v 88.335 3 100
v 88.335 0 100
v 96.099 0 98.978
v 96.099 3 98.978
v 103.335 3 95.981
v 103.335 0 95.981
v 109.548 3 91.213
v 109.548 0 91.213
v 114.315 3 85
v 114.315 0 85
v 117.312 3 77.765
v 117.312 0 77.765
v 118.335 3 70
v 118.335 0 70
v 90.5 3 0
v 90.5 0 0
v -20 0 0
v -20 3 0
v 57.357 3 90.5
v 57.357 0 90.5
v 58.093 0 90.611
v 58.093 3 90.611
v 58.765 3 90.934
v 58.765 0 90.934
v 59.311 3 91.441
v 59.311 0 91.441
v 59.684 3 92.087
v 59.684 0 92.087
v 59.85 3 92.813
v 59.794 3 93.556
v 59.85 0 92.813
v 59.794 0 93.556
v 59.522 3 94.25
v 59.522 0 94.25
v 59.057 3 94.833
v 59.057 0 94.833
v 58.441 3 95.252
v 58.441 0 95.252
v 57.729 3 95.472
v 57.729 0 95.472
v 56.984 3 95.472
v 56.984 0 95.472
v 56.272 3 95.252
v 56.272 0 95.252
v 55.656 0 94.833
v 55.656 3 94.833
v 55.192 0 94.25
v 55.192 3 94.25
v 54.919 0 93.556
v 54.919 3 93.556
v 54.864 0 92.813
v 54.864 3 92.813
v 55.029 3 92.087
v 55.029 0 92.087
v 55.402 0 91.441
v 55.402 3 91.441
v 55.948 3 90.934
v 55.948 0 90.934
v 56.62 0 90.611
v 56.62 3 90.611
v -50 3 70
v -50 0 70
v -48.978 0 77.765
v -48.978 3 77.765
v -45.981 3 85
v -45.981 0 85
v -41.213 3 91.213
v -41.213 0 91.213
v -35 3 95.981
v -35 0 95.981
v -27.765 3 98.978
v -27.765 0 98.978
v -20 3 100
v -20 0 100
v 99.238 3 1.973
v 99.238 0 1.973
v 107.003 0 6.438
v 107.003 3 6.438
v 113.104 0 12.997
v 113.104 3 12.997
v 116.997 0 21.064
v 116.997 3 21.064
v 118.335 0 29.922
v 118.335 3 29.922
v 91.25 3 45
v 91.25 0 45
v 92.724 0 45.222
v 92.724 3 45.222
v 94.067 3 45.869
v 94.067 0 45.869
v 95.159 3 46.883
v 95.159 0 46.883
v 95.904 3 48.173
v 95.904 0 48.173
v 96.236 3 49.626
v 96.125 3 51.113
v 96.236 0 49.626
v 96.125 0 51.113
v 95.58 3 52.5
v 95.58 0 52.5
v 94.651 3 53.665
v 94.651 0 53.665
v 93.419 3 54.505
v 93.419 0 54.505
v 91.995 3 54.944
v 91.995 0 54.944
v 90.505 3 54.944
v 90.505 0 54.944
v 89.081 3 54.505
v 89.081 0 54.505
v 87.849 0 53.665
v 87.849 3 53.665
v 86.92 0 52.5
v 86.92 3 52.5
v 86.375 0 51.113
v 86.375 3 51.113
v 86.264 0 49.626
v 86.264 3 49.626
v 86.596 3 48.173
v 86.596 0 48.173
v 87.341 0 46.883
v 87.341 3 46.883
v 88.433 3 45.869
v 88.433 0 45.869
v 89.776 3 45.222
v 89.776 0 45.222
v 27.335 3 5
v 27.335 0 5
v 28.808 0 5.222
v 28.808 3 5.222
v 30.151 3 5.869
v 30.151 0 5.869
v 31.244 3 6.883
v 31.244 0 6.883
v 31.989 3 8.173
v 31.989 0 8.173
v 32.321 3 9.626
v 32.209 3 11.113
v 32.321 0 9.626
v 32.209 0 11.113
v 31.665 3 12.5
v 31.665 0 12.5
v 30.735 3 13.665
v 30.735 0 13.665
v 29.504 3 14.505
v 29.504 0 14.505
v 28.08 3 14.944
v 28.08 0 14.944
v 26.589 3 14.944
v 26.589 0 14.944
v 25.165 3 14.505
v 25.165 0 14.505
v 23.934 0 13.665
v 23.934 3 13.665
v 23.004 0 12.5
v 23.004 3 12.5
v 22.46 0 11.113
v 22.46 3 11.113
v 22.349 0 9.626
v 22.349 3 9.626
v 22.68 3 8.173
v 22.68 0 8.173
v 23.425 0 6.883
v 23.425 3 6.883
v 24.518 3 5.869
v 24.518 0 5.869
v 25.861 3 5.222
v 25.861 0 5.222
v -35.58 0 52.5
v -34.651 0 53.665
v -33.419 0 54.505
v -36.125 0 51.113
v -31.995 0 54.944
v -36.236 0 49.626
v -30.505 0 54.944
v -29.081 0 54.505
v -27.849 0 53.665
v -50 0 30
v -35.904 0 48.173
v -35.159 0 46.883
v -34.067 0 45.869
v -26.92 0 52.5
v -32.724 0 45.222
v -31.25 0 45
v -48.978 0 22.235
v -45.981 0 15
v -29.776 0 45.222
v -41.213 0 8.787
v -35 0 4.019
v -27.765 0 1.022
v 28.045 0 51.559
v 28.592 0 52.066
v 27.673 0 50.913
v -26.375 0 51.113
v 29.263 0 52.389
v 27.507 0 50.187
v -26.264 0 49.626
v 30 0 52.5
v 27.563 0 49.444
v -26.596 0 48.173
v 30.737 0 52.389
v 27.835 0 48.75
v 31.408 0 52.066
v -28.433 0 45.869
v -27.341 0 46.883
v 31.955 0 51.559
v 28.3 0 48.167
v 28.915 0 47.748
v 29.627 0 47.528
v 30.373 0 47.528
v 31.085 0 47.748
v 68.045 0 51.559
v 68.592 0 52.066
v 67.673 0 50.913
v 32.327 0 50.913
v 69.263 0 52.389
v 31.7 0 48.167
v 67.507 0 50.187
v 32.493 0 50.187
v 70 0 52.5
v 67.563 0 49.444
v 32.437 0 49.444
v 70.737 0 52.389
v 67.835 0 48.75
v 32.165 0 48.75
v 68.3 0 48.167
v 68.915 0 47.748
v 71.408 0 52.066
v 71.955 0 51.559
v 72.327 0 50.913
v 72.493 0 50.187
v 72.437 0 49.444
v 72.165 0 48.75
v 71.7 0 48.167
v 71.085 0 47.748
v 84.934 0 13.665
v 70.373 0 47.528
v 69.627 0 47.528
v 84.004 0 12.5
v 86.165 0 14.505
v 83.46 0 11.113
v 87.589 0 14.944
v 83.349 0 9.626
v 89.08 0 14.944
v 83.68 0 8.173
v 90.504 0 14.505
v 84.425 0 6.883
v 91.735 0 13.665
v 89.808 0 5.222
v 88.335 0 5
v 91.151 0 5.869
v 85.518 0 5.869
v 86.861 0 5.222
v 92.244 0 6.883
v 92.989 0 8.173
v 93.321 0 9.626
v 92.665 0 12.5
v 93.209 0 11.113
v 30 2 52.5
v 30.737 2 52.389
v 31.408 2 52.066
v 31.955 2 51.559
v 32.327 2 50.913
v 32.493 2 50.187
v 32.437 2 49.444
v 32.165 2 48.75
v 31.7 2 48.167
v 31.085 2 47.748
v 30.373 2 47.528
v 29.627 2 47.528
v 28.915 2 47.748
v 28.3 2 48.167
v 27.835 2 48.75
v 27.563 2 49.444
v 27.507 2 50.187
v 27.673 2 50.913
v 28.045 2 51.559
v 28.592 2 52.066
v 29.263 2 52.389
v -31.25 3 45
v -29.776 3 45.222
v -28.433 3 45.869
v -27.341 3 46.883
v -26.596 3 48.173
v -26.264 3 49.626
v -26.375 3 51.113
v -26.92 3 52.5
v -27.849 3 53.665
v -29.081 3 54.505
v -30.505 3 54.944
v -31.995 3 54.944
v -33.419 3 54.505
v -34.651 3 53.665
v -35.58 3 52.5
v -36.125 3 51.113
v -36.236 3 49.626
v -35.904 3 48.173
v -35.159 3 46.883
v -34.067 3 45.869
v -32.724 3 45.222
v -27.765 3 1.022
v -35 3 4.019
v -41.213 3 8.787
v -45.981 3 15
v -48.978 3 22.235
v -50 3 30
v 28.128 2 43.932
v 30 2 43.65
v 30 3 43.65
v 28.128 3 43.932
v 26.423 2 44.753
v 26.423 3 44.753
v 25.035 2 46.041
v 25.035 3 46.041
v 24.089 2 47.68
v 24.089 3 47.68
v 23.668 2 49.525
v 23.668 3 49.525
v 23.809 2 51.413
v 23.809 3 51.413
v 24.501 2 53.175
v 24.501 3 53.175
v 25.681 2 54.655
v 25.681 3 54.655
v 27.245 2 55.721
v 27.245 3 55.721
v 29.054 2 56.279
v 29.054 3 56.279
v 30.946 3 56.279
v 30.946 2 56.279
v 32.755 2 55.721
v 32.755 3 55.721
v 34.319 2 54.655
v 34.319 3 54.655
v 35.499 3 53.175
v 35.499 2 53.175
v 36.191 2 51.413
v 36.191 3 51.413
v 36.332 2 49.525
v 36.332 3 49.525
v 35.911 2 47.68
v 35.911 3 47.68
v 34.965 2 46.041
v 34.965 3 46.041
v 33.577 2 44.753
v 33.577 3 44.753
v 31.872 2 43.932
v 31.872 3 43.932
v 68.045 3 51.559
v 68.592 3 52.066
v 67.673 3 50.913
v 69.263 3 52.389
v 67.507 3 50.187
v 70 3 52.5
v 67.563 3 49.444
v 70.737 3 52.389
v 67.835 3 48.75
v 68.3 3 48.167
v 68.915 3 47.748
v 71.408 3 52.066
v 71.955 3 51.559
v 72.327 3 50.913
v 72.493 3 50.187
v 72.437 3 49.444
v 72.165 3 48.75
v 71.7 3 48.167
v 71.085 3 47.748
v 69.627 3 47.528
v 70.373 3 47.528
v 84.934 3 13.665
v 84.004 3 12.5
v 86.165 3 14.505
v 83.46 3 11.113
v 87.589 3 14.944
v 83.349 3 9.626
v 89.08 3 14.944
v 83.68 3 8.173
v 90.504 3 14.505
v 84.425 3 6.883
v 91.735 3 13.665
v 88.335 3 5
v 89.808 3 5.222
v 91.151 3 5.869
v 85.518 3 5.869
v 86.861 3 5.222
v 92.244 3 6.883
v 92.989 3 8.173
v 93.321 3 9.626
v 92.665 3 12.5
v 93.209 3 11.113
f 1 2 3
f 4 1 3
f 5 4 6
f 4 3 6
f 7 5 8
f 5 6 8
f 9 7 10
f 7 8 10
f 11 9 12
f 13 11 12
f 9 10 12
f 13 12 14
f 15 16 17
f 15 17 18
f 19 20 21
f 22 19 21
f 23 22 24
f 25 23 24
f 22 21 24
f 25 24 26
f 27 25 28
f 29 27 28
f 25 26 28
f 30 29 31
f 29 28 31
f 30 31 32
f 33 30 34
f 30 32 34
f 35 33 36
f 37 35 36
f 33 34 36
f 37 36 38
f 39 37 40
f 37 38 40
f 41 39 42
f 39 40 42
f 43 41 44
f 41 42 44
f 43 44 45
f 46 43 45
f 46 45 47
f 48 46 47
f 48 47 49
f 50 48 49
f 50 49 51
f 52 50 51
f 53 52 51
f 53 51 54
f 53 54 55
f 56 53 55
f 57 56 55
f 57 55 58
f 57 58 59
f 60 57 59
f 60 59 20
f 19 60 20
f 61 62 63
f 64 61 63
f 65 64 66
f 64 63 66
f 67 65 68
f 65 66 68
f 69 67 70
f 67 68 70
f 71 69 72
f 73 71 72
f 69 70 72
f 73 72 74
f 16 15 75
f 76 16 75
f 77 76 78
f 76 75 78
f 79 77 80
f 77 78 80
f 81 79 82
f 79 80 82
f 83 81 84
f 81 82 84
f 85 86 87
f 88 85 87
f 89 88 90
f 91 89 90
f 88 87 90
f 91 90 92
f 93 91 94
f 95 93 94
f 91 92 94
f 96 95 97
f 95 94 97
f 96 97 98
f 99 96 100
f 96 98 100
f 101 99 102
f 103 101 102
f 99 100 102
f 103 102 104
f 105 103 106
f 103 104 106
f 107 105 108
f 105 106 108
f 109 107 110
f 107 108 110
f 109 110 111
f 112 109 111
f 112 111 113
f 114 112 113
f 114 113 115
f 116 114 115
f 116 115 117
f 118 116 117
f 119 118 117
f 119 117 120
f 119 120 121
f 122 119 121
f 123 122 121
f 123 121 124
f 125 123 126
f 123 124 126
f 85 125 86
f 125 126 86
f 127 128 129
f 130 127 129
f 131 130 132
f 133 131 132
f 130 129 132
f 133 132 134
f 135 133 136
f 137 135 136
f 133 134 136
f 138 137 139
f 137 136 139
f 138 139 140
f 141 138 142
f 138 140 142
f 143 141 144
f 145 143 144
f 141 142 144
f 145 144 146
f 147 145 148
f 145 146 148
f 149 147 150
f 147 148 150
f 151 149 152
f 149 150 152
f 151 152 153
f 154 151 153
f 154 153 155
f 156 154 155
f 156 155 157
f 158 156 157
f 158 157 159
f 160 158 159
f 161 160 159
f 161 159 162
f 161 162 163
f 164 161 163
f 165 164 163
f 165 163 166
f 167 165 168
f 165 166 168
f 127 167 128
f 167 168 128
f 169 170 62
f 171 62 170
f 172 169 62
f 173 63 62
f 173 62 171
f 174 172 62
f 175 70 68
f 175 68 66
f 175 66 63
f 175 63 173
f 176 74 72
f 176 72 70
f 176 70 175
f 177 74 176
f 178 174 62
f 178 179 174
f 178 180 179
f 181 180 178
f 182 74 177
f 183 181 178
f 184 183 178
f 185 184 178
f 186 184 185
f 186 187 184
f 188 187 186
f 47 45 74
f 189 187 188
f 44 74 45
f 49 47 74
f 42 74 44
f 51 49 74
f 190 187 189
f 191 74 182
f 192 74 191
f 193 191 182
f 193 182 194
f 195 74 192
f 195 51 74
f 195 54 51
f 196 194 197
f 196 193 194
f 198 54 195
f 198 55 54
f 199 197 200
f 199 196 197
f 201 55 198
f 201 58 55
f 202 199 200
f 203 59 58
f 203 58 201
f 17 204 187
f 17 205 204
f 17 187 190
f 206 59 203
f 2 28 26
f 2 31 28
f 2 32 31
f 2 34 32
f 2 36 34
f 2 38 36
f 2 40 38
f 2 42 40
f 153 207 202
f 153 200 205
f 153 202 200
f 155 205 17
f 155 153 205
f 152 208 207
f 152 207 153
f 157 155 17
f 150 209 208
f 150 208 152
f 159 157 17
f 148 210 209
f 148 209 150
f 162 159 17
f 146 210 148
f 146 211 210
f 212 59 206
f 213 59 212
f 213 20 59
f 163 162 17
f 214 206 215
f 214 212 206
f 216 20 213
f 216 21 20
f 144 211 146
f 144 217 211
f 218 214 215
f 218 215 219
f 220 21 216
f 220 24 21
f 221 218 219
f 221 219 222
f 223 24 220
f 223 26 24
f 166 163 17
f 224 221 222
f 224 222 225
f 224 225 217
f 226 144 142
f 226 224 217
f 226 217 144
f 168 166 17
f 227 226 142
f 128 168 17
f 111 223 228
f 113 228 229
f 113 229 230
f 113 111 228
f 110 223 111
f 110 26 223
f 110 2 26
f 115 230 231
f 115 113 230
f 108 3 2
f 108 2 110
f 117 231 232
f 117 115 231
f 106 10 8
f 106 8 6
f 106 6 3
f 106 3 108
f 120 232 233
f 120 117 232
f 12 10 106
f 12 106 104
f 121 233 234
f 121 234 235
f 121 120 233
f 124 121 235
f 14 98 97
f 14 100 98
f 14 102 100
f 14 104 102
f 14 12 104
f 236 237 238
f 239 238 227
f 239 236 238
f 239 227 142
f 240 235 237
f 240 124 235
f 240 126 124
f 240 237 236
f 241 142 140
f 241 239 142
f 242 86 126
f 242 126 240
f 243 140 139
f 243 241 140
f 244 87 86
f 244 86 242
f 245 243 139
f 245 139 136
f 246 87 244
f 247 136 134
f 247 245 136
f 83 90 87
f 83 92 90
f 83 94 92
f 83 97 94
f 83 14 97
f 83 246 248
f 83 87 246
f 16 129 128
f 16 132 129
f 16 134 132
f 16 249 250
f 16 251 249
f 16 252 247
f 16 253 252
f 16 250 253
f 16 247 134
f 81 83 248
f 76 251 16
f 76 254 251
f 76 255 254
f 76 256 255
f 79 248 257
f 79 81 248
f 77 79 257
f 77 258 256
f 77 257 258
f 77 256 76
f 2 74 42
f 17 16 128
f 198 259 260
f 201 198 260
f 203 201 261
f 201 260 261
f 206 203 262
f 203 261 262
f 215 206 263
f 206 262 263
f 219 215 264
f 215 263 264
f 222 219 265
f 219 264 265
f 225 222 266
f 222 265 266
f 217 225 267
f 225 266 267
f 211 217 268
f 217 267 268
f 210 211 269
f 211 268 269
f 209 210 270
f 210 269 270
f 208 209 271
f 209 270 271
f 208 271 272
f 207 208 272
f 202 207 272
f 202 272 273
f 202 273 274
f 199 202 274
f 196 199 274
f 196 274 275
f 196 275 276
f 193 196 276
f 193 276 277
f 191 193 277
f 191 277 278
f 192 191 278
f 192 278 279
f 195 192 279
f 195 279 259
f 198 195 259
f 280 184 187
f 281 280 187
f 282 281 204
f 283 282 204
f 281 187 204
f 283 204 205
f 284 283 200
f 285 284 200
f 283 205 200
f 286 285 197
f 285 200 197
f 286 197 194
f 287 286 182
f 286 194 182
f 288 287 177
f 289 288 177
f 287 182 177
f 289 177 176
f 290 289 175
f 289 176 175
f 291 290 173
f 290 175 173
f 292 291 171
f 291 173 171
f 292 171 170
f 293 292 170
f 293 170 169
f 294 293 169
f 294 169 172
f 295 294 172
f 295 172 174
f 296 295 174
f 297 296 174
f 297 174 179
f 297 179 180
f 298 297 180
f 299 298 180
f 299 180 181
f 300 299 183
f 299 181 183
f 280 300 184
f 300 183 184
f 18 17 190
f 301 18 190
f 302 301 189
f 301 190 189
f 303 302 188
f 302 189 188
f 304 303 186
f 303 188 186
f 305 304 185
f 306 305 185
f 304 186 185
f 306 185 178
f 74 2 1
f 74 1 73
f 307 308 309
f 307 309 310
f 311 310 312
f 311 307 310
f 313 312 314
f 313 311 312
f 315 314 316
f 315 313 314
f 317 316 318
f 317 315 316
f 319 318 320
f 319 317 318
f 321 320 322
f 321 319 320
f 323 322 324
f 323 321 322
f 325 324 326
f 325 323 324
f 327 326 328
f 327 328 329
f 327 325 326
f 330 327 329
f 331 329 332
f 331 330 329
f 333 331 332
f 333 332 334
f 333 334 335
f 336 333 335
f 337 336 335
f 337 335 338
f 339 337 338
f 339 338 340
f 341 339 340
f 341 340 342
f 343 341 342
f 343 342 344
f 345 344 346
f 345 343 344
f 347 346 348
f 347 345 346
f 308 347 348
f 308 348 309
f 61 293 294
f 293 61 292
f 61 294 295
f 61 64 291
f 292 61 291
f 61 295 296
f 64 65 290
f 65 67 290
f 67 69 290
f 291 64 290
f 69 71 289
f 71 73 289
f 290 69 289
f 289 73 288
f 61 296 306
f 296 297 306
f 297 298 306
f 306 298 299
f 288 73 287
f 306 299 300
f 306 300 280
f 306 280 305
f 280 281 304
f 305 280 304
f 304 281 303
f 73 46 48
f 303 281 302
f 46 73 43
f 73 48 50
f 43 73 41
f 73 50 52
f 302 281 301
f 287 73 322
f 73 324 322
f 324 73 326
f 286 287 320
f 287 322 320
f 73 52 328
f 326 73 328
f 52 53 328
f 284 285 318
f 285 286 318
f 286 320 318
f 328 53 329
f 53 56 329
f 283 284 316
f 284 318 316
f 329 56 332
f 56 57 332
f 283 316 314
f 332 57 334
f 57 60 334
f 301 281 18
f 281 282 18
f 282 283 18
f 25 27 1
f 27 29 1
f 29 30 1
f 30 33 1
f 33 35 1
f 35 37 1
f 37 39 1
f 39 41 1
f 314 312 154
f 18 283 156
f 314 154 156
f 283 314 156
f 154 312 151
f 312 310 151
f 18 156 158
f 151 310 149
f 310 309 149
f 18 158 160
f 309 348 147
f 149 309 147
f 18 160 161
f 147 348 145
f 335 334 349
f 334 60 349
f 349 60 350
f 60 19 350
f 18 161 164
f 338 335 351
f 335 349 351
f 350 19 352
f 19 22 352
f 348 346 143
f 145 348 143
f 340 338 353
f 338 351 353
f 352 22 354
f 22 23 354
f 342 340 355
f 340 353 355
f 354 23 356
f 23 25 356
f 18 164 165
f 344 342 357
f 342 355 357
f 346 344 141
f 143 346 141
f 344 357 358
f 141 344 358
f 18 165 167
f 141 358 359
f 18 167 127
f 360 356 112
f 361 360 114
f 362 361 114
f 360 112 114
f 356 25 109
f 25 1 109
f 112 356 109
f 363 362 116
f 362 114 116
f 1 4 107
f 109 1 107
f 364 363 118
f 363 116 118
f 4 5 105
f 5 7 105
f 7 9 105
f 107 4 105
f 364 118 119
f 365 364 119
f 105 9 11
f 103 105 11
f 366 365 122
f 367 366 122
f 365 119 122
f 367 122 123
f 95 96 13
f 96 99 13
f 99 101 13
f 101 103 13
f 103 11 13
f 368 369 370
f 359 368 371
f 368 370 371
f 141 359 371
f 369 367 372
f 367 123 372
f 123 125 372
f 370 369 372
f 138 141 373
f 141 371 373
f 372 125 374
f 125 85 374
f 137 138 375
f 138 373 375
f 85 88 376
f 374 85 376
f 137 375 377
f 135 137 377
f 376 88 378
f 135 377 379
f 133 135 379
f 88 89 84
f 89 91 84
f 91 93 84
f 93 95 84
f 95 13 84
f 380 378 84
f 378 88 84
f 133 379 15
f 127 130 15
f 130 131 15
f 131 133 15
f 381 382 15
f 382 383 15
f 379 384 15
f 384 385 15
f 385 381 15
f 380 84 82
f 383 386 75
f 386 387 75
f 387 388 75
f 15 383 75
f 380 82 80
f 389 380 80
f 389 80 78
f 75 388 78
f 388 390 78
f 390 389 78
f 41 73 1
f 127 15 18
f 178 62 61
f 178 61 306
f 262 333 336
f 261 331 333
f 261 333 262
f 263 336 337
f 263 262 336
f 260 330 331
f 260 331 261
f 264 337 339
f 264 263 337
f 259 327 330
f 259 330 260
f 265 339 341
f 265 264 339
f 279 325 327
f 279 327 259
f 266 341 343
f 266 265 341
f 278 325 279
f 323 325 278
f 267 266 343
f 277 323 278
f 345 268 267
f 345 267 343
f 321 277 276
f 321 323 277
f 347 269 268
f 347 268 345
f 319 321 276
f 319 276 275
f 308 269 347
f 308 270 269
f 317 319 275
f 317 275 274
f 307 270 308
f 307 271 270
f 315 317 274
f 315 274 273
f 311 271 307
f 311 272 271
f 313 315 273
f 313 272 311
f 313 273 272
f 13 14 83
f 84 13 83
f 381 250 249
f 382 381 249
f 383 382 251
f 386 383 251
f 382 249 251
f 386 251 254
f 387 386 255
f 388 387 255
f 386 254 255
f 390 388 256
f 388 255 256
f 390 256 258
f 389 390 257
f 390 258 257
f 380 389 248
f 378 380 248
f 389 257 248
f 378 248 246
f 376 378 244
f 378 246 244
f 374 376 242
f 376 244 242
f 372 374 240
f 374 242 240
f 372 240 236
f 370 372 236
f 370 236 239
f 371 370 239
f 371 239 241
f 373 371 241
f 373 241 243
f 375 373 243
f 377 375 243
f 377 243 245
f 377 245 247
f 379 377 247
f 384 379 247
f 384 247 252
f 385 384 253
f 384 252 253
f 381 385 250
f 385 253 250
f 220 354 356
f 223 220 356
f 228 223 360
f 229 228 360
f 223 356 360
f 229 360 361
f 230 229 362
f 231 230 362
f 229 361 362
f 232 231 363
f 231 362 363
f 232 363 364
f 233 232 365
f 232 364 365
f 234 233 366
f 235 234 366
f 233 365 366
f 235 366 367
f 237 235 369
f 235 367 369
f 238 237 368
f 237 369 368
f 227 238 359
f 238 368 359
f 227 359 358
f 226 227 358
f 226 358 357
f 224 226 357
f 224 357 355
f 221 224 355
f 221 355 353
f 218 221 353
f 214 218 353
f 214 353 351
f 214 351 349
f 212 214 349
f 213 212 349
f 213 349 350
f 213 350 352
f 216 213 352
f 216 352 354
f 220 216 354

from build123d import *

# Parameters (mm, degrees)
EXTRUDE_1_DEPTH           = 50
EXTRUDE_1_DEPTH_BACK      = 50
SKETCH_2_W                = 200
SKETCH_2_H                = 100
EXTRUDE_2_DEPTH           = 40
SKETCH_3_W                = 200
SKETCH_3_H                = 34
CUT_EXTRUDE_1_DEPTH       = 100
CUT_EXTRUDE_2_DEPTH       = 279.66871012
SKETCH_8_R                = 2.5
CUT_EXTRUDE_4_DEPTH       = 276.238532913
SKETCH_10_R               = 5
CUT_EXTRUDE_5_DEPTH       = 260.608358879
EXTRUDE_5_DEPTH           = 10
SKETCH_13_W               = 74.115787845
SKETCH_13_H               = 3
EXTRUDE_7_DEPTH           = 81
SKETCH_14_W               = 207.5
SKETCH_14_H               = 100
EXTRUDE_8_DEPTH           = 7
EXTRUDE_9_DEPTH           = 10
SKETCH_17_R               = 6.35
CUT_EXTRUDE_6_DEPTH       = 1
CUT_EXTRUDE_START         = -1
SKETCH_18_R               = 6.35
CUT_EXTRUDE_7_DEPTH       = 1
SKETCH_20_R               = 5
CUT_EXTRUDE_8_DEPTH       = 3
CUT_EXTRUDE_9_DEPTH       = 273.255129638
CUT_EXTRUDE_9_DEPTH_BACK  = 273.255129638
SKETCH_21_W               = 31.665374736
SKETCH_21_H               = 100
SKETCH_22_R               = 5
EXTRUDE_10_DEPTH          = 37
FILLET_1_R                = 30
FILLET_2_R                = 30
CUT_EXTRUDE_10_DEPTH      = 248.444254611
CUT_EXTRUDE_10_DEPTH_BACK = 248.444254611
CUT_EXTRUDE_11_DEPTH      = 211.689689342
CUT_EXTRUDE_11_DEPTH_BACK = 211.689689342
CUT_EXTRUDE_12_DEPTH      = 174.368632309
CUT_EXTRUDE_12_DEPTH_BACK = 174.368632309
SKETCH_26_R               = 5
CUT_EXTRUDE_13_DEPTH      = 153.295269567
CUT_EXTRUDE_13_DEPTH_BACK = 153.295269567
CUT_EXTRUDE_14_DEPTH      = 160.286168691
CUT_EXTRUDE_14_DEPTH_BACK = 160.286168691
SKETCH_30_R               = 7.5
CUT_EXTRUDE_15_DEPTH      = 160.286168691
CUT_EXTRUDE_15_DEPTH_BACK = 160.286168691
SKETCH_31_R               = 7.5
SKETCH_32_R               = 7.5
SKETCH_32_R_2             = 5
EXTRUDE_12_DEPTH          = 3
SKETCH_33_R               = 7.5
SKETCH_33_R_2             = 5
EXTRUDE_13_DEPTH          = 3
SKETCH_34_R               = 5
EXTRUDE_14_DEPTH          = 45
CUT_EXTRUDE_19_DEPTH      = 178.031776809
CUT_EXTRUDE_19_DEPTH_BACK = 178.031776809
SKETCH_41_W               = 127.955451874
SKETCH_41_H               = 44.187888027
CUT_EXTRUDE_20_DEPTH      = 173.639074372
CUT_EXTRUDE_20_DEPTH_BACK = 173.639074372
SKETCH_42_W               = 60.696300107
SKETCH_42_H               = 16.694862056
SKETCH_44_R               = 2.5
CUT_EXTRUDE_21_DEPTH      = 10


with BuildPart() as part:
    # 草图1 → 凸台-拉伸1 (new, two sides: drawn at the far end of the back side and taken through both)
    with BuildSketch(Plane(origin=(0, 0, 0), x_dir=(1, 0, 0), z_dir=(0, 1, 0)).offset(-EXTRUDE_1_DEPTH_BACK)):
        Polygon((9.5, 12.5), (9.5, 0), (90.5, 0), (90.5, 12.5), (90.5, 212.5), (9.5, 212.5), align=None)
    extrude(amount=EXTRUDE_1_DEPTH + EXTRUDE_1_DEPTH_BACK)

    # 草图2 → 凸台-拉伸2 (add)
    with BuildSketch(Plane(origin=(0, 0, 0), x_dir=(-1, 0, 0), z_dir=(0, -1, 0))):
        with Locations((-50, -50)):
            Rectangle(SKETCH_2_W, SKETCH_2_H)
    extrude(amount=-EXTRUDE_2_DEPTH)

    # 草图3 → 切除-拉伸1 (cut)
    with BuildSketch(Plane.XY.offset(100)):
        with Locations((50, 20)):
            Rectangle(SKETCH_3_W, SKETCH_3_H)
    extrude(amount=-CUT_EXTRUDE_1_DEPTH, mode=Mode.SUBTRACT)

    # 草图6 → 切除-拉伸2 (cut, through all)
    with BuildSketch(Plane(origin=(0, 50, 0), x_dir=(1, 0, 0), z_dir=(0, 1, 0))):
        Polygon((12.5, 905.325014188), (12.5, 212.5), (12.5, 5), (87.5, 5), (87.5, 212.5), (87.5, 905.325014188), (87.5, 2290.975042562), (12.5, 2290.975042562), align=None)
    extrude(amount=-CUT_EXTRUDE_2_DEPTH, mode=Mode.SUBTRACT)

    # 草图8 → 切除-拉伸4 (cut, through all)
    with BuildSketch(Plane(origin=(0, 40, 0), x_dir=(1, 0, 0), z_dir=(0, 1, 0))):
        with Locations(Location((70, -50, 0), (0, 0, 270))):
            Circle(SKETCH_8_R)
        with Locations(Location((30, -50, 0), (0, 0, 270))):
            Circle(SKETCH_8_R)
    extrude(amount=-CUT_EXTRUDE_4_DEPTH, mode=Mode.SUBTRACT)

    # 草图10 → 切除-拉伸5 (cut, through all)
    with BuildSketch(Plane(origin=(90.5, 0, 0), x_dir=(0, 0, -1), z_dir=(1, 0, 0))):
        with Locations((80, 0)):
            Circle(SKETCH_10_R)
        with Locations((180, 0)):
            Circle(SKETCH_10_R)
    extrude(amount=-CUT_EXTRUDE_5_DEPTH, mode=Mode.SUBTRACT)

    # 草图11 → 凸台-拉伸5 (add)
    with BuildSketch(Plane.ZY.offset(-9.5)):
        Polygon((-30.905613639, 83.415207604), (-74.094429483, 50), (0, 50), (0, 40), (83.32101017, 40), align=None)
    extrude(amount=-EXTRUDE_5_DEPTH)

    # 草图13 → 凸台-拉伸7 (add)
    with BuildSketch(Plane(origin=(90.5, 0, 0), x_dir=(0, 0, -1), z_dir=(1, 0, 0))):
        with Locations((37.057893922, 51.5)):
            Rectangle(SKETCH_13_W, SKETCH_13_H)
    extrude(amount=-EXTRUDE_7_DEPTH)

    # 草图14 → 凸台-拉伸8 (add)
    with BuildSketch(Plane(origin=(12.5, 0, 0), x_dir=(0, 0, -1), z_dir=(1, 0, 0))):
        with Locations((108.75, 0)):
            Rectangle(SKETCH_14_W, SKETCH_14_H)
    extrude(amount=EXTRUDE_8_DEPTH)

    # 草图15 → 凸台-拉伸9 (add)
    with BuildSketch(Plane(origin=(90.5, 0, 0), x_dir=(0, 0, -1), z_dir=(1, 0, 0))):
        Polygon((30.905613639, 83.415207604), (-82.902171575, 40), (0, 40), (0, 53), (70.216960007, 53), align=None)
    extrude(amount=-EXTRUDE_9_DEPTH)

    # 草图17 → 切除-拉伸6 (cut)
    with BuildSketch(Plane(origin=(0, 37, 0), x_dir=(-1, 0, 0), z_dir=(0, -1, 0))):
        with Locations(Location((-30, -50, 0), (0, 0, 90))):
            Circle(SKETCH_17_R)
    extrude(amount=-CUT_EXTRUDE_6_DEPTH, mode=Mode.SUBTRACT)

    # 草图18 → 切除-拉伸7 (cut)
    with BuildSketch(Plane(origin=(0, 3, 0), x_dir=(1, 0, 0), z_dir=(0, 1, 0)).offset(CUT_EXTRUDE_START)):
        with Locations(Location((30, -50, 0), (0, 0, 90))):
            Circle(SKETCH_18_R)
    extrude(amount=CUT_EXTRUDE_7_DEPTH, mode=Mode.SUBTRACT)

    # 草图20 → 切除-拉伸8 (cut)
    with BuildSketch(Plane.XZ):
        with Locations(Location((-31.25, 50, 0), (0, 0, 270))):
            Circle(SKETCH_20_R)
        with Locations(Location((91.25, 50, 0), (0, 0, 270))):
            Circle(SKETCH_20_R)
    extrude(amount=-CUT_EXTRUDE_8_DEPTH, mode=Mode.SUBTRACT)

    # 草图21 → 切除-拉伸9 (cut, two sides: drawn at the far end of the back side and taken through both)
    with BuildSketch(Plane(origin=(0, 3, 0), x_dir=(1, 0, 0), z_dir=(0, 1, 0)).offset(-CUT_EXTRUDE_9_DEPTH_BACK)):
        with Locations((134.167312632, -50)):
            Rectangle(SKETCH_21_W, SKETCH_21_H)
    extrude(amount=CUT_EXTRUDE_9_DEPTH + CUT_EXTRUDE_9_DEPTH_BACK, mode=Mode.SUBTRACT)

    # 草图22 → 凸台-拉伸10 (add)
    with BuildSketch(Plane.XZ):
        with Locations((-28.834995313, 14.93844285)):
            Circle(SKETCH_22_R)
        with Locations((99.943738589, 14.93844285)):
            Circle(SKETCH_22_R)
        with Locations((47.358621855, 88.902784002)):
            Circle(SKETCH_22_R)
    extrude(amount=-EXTRUDE_10_DEPTH)

    # 圆角1
    # the kernel refuses this fillet: 30 mm, written as the material it takes off along each edge
    with BuildSketch(Plane(origin=(-32.536340759, 83.415207604, -30.905613639), x_dir=(0, -0.6119293356637439, -0.7909124402575352), z_dir=(1, 0, 0))) as fillet_1_piece_1:
        with BuildLine():
            CenterArc((FILLET_1_R * 0.560484543454, -FILLET_1_R), FILLET_1_R, 90, 58.539912966)
            Line((-FILLET_1_R * 0.292519393108, -FILLET_1_R * 0.478095521948), (-FILLET_1_R * 0.309579471839, -FILLET_1_R * 0.467657432387))
            Line((-FILLET_1_R * 0.309579471839, -FILLET_1_R * 0.467657432387), (-FILLET_1_R * 0.0112096908691, FILLET_1_R * 0.02))
            Line((-FILLET_1_R * 0.0112096908691, FILLET_1_R * 0.02), (FILLET_1_R * 0.560484543454, FILLET_1_R * 0.02))
            Line((FILLET_1_R * 0.560484543454, FILLET_1_R * 0.02), (FILLET_1_R * 0.560484543454, 0))
        make_face()
    extrude(amount=94.072681518, mode=Mode.SUBTRACT)
    with BuildSketch(Plane(origin=(132.596564701, 83.415207604, -30.905613639), x_dir=(0, -0.6119293356637436, -0.7909124402575354), z_dir=(-1, 0, 0))) as fillet_1_piece_2:
        with BuildLine():
            CenterArc((FILLET_1_R * 0.561287529341, FILLET_1_R), FILLET_1_R, 211.390091687, 58.609908313)
            Line((-FILLET_1_R * 0.292353354769, FILLET_1_R * 0.479137982787), (-FILLET_1_R * 0.309426172451, FILLET_1_R * 0.468720742443))
            Line((-FILLET_1_R * 0.309426172451, FILLET_1_R * 0.468720742443), (-FILLET_1_R * 0.0112257505868, -FILLET_1_R * 0.02))
            Line((-FILLET_1_R * 0.0112257505868, -FILLET_1_R * 0.02), (FILLET_1_R * 0.561287529341, -FILLET_1_R * 0.02))
            Line((FILLET_1_R * 0.561287529341, -FILLET_1_R * 0.02), (FILLET_1_R * 0.561287529341, 0))
        make_face()
    extrude(amount=94.193129401, mode=Mode.SUBTRACT)
    with BuildSketch(Plane(origin=(118.334625264, -38, 100), x_dir=(-1, 0, 0), z_dir=(0, 1, 0)), Plane(origin=(118.334625264, -75, 100), x_dir=(-1, 0, 0), z_dir=(0, 1, 0)), Plane(origin=(-50, -38, 0), x_dir=(1, 0, 0), z_dir=(0, 1, 0)), Plane(origin=(-50, -38, 100), x_dir=(0, 0, -1), z_dir=(0, 1, 0)), Plane(origin=(-50, -75, 100), x_dir=(0, 0, -1), z_dir=(0, 1, 0)), Plane(origin=(-50, -75, 0), x_dir=(1, 0, 0), z_dir=(0, 1, 0))) as fillet_1_piece_3:
        with BuildLine():
            CenterArc((FILLET_1_R, -FILLET_1_R), FILLET_1_R, 90, 90)
            Line((0, -FILLET_1_R), (-FILLET_1_R * 0.02, -FILLET_1_R))
            Line((-FILLET_1_R * 0.02, -FILLET_1_R), (-FILLET_1_R * 0.02, FILLET_1_R * 0.02))
            Line((-FILLET_1_R * 0.02, FILLET_1_R * 0.02), (FILLET_1_R, FILLET_1_R * 0.02))
            Line((FILLET_1_R, FILLET_1_R * 0.02), (FILLET_1_R, 0))
        make_face()
    extrude(amount=153, mode=Mode.SUBTRACT)
    with BuildSketch(Plane(origin=(118.334625264, 114.804376219, 0), x_dir=(0, 0, 1), z_dir=(0, -1, 0))) as fillet_1_piece_4:
        with BuildLine():
            CenterArc((29.921750488, 30), FILLET_1_R, 184.139160489, 85.860839511)
            Line((0, 27.834625264), (-0.59843501, 27.791317769))
            ThreePointArc((-0.59843501, 27.791317769), (-0.6, 13.917312632), (-0.6, 0))
            Line((-0.6, 0), (0, -0.6))
            Line((0, -0.6), (29.921750488, -0.6))
            Line((29.921750488, -0.6), (29.921750488, 0))
        make_face()
    extrude(amount=152.608752439, mode=Mode.SUBTRACT)
    with BuildSketch(Plane(origin=(118.334625264, 77.804376219, 0), x_dir=(-1, 0, 0), z_dir=(0, -1, 0))) as fillet_1_piece_5:
        with BuildLine():
            CenterArc((30, -29.921750488), FILLET_1_R, 94.139160489, 85.860839511)
            Line((0, -29.921750488), (-0.6, -29.921750488))
            Line((-0.6, -29.921750488), (-0.6, 0))
            Line((-0.6, 0), (0, 0.6))
            ThreePointArc((0, 0.6), (13.917312632, 0.6), (27.791317769, 0.59843501))
            Line((27.791317769, 0.59843501), (27.834625264, 0))
        make_face()
    extrude(amount=152.608752439, mode=Mode.SUBTRACT)

    # 圆角2
    fillet_2_edges = [part.edges().sort_by_distance(p)[0] for p in [
        (89, 50, -212.5),
        (89, -50, -212.5),
        (14.5, 50, -212.5),
        (14.5, -50, -212.5),
    ]]
    fillet(fillet_2_edges, radius=FILLET_2_R)

    # 草图23 → 切除-拉伸10 (cut, two sides: drawn at the far end of the back side and taken through both)
    with BuildSketch(Plane(origin=(19.5, 0, 0), x_dir=(0, 0, -1), z_dir=(1, 0, 0)).offset(-CUT_EXTRUDE_10_DEPTH_BACK)):
        Polygon((-82.902171575, 40), (15.172878857, 77.413509693), (30.26062931, 83.169160038), (82.911746167, 53.484816406), (216.982404769, 51.400816531), (216.982404769, -53.030732743), (0, -55.346288159), (0, 40), align=None)
    extrude(amount=CUT_EXTRUDE_10_DEPTH + CUT_EXTRUDE_10_DEPTH_BACK, mode=Mode.SUBTRACT)

    # 草图25 → 切除-拉伸11 (cut, two sides: drawn at the far end of the back side and taken through both)
    with BuildSketch(Plane(origin=(118.334625264, 0, 0), x_dir=(0, 0, -1), z_dir=(1, 0, 0)).offset(-CUT_EXTRUDE_11_DEPTH_BACK)):
        Polygon((-96.999238457, 37), (-5.714105567, 37), (-5.714105567, 3), (-98.622428797, 3), align=None)
    extrude(amount=CUT_EXTRUDE_11_DEPTH + CUT_EXTRUDE_11_DEPTH_BACK, mode=Mode.SUBTRACT)


with BuildPart() as cut_extrude_11_piece_1:
    # of the separate pieces the step leaves, piece 1, a body of its own (cut_extrude_11_pieces)
    add(part.part.solids().sort_by_distance((118.334625264, 37, 70))[0])


with BuildPart() as cut_extrude_11_piece_2:
    # of the separate pieces the step leaves, piece 2, a body of its own (cut_extrude_11_pieces)
    add(part.part.solids().sort_by_distance((-20, 0, 0))[0])


with BuildPart() as cut_extrude_12_tool:
    # 草图26 → 切除-拉伸12 (new, two sides: drawn at the far end of the back side and taken through both)
    with BuildSketch(Plane.XZ.offset(-CUT_EXTRUDE_12_DEPTH_BACK)):
        with Locations(Location((88.334625264, 10, 0), (0, 0, 270))):
            Circle(SKETCH_26_R)
        with Locations(Location((27.334625264, 10, 0), (0, 0, 270))):
            Circle(SKETCH_26_R)
    extrude(amount=CUT_EXTRUDE_12_DEPTH + CUT_EXTRUDE_12_DEPTH_BACK)


with BuildPart() as cut_extrude_11_piece_1_1:
    add(cut_extrude_11_piece_1.part)

    # 切除-拉伸12: cut by cut_extrude_12_tool
    add(cut_extrude_12_tool.part, mode=Mode.SUBTRACT)

    # 草图27 → 切除-拉伸13 (cut, two sides: drawn at the far end of the back side and taken through both)
    with BuildSketch(Plane.ZY.offset(-34.5).offset(-CUT_EXTRUDE_13_DEPTH_BACK)):
        Polygon((-18.94184398, 81.696068066), (-17.663883038, 66.307288383), (80.739109538, 40), (87.341907742, 40), align=None)
    extrude(amount=CUT_EXTRUDE_13_DEPTH + CUT_EXTRUDE_13_DEPTH_BACK, mode=Mode.SUBTRACT)


with BuildPart() as cut_extrude_11_piece_2_1:
    add(cut_extrude_11_piece_2.part)

    # 切除-拉伸12: cut by cut_extrude_12_tool
    add(cut_extrude_12_tool.part, mode=Mode.SUBTRACT)


with BuildPart() as cut_extrude_14_tool:
    # 草图30 → 切除-拉伸14 (new, two sides: drawn at the far end of the back side and taken through both)
    with BuildSketch(Plane.XZ.offset(-37).offset(-CUT_EXTRUDE_14_DEPTH_BACK)):
        with Locations(Location((88.334625264, 10, 0), (0, 0, 270))):
            Circle(SKETCH_30_R)
    extrude(amount=CUT_EXTRUDE_14_DEPTH + CUT_EXTRUDE_14_DEPTH_BACK)


with BuildPart() as cut_extrude_11_piece_1_2:
    add(cut_extrude_11_piece_1_1.part)

    # 切除-拉伸14: cut by cut_extrude_14_tool
    add(cut_extrude_14_tool.part, mode=Mode.SUBTRACT)


with BuildPart() as cut_extrude_11_piece_2_2:
    add(cut_extrude_11_piece_2_1.part)

    # 切除-拉伸14: cut by cut_extrude_14_tool
    add(cut_extrude_14_tool.part, mode=Mode.SUBTRACT)


with BuildPart() as cut_extrude_15_tool:
    # 草图31 → 切除-拉伸15 (new, two sides: drawn at the far end of the back side and taken through both)
    with BuildSketch(Plane.XZ.offset(-37).offset(-CUT_EXTRUDE_15_DEPTH_BACK)):
        with Locations(Location((27.334625264, 10, 0), (0, 0, 270))):
            Circle(SKETCH_31_R)
    extrude(amount=CUT_EXTRUDE_15_DEPTH + CUT_EXTRUDE_15_DEPTH_BACK)


with BuildPart() as cut_extrude_11_piece_1_3:
    add(cut_extrude_11_piece_1_2.part)

    # 切除-拉伸15: cut by cut_extrude_15_tool
    add(cut_extrude_15_tool.part, mode=Mode.SUBTRACT)



with BuildPart() as cut_extrude_11_piece_2_3:
    add(cut_extrude_11_piece_2_2.part)

    # 切除-拉伸15: cut by cut_extrude_15_tool
    add(cut_extrude_15_tool.part, mode=Mode.SUBTRACT)

    # 草图32 → 凸台-拉伸12 (add)
    with BuildSketch(Plane.XZ):
        with Locations(Location((27.334625264, 10, 0), (0, 0, 270))):
            Circle(SKETCH_32_R)
        with Locations(Location((27.334625264, 10, 0), (0, 0, 270))):
            Circle(SKETCH_32_R_2, mode=Mode.SUBTRACT)
    extrude(amount=-EXTRUDE_12_DEPTH)

    # 草图33 → 凸台-拉伸13 (add)
    with BuildSketch(Plane.XZ):
        with Locations(Location((88.334625264, 10, 0), (0, 0, 270))):
            Circle(SKETCH_33_R)
        with Locations(Location((88.334625264, 10, 0), (0, 0, 270))):
            Circle(SKETCH_33_R_2, mode=Mode.SUBTRACT)
    extrude(amount=-EXTRUDE_13_DEPTH)


with BuildPart() as cut_extrude_11_piece_1_4:
    add(cut_extrude_11_piece_1_3.part)

    add(cut_extrude_11_piece_2_3.part)  # 凸台-拉伸14 merges 切除-拉伸11 piece 2
    # 草图34 → 凸台-拉伸14 (add)
    with BuildSketch(Plane.XZ.offset(-37)):
        with Locations(Location((57.356592352, 86.553493229, 0), (0, 0, 90))):
            Circle(SKETCH_34_R)
    extrude(amount=EXTRUDE_14_DEPTH)

    # 草图41 → 切除-拉伸19 (cut, two sides: drawn at the far end of the back side and taken through both)
    with BuildSketch(Plane(origin=(90.5, 0, 0), x_dir=(0, 0, -1), z_dir=(1, 0, 0)).offset(-CUT_EXTRUDE_19_DEPTH_BACK)):
        with Locations((-46.591902261, 25.093944013)):
            Rectangle(SKETCH_41_W, SKETCH_41_H)
    extrude(amount=CUT_EXTRUDE_19_DEPTH + CUT_EXTRUDE_19_DEPTH_BACK, mode=Mode.SUBTRACT)

    # 草图42 → 切除-拉伸20 (cut, two sides: drawn at the far end of the back side and taken through both)
    with BuildSketch(Plane(origin=(90.5, 0, 0), x_dir=(0, 0, -1), z_dir=(1, 0, 0)).offset(-CUT_EXTRUDE_20_DEPTH_BACK)):
        with Locations((-72.283598444, -8.347431028)):
            Rectangle(SKETCH_42_W, SKETCH_42_H)
    extrude(amount=CUT_EXTRUDE_20_DEPTH + CUT_EXTRUDE_20_DEPTH_BACK, mode=Mode.SUBTRACT)

    # 草图44 → 切除-拉伸21 (cut)
    with BuildSketch(Plane.XZ):
        with Locations(Location((57.356592352, 93, 0), (0, 0, 270))):
            Circle(SKETCH_44_R)
    extrude(amount=-CUT_EXTRUDE_21_DEPTH, mode=Mode.SUBTRACT)


solid = cut_extrude_11_piece_1_4.part
